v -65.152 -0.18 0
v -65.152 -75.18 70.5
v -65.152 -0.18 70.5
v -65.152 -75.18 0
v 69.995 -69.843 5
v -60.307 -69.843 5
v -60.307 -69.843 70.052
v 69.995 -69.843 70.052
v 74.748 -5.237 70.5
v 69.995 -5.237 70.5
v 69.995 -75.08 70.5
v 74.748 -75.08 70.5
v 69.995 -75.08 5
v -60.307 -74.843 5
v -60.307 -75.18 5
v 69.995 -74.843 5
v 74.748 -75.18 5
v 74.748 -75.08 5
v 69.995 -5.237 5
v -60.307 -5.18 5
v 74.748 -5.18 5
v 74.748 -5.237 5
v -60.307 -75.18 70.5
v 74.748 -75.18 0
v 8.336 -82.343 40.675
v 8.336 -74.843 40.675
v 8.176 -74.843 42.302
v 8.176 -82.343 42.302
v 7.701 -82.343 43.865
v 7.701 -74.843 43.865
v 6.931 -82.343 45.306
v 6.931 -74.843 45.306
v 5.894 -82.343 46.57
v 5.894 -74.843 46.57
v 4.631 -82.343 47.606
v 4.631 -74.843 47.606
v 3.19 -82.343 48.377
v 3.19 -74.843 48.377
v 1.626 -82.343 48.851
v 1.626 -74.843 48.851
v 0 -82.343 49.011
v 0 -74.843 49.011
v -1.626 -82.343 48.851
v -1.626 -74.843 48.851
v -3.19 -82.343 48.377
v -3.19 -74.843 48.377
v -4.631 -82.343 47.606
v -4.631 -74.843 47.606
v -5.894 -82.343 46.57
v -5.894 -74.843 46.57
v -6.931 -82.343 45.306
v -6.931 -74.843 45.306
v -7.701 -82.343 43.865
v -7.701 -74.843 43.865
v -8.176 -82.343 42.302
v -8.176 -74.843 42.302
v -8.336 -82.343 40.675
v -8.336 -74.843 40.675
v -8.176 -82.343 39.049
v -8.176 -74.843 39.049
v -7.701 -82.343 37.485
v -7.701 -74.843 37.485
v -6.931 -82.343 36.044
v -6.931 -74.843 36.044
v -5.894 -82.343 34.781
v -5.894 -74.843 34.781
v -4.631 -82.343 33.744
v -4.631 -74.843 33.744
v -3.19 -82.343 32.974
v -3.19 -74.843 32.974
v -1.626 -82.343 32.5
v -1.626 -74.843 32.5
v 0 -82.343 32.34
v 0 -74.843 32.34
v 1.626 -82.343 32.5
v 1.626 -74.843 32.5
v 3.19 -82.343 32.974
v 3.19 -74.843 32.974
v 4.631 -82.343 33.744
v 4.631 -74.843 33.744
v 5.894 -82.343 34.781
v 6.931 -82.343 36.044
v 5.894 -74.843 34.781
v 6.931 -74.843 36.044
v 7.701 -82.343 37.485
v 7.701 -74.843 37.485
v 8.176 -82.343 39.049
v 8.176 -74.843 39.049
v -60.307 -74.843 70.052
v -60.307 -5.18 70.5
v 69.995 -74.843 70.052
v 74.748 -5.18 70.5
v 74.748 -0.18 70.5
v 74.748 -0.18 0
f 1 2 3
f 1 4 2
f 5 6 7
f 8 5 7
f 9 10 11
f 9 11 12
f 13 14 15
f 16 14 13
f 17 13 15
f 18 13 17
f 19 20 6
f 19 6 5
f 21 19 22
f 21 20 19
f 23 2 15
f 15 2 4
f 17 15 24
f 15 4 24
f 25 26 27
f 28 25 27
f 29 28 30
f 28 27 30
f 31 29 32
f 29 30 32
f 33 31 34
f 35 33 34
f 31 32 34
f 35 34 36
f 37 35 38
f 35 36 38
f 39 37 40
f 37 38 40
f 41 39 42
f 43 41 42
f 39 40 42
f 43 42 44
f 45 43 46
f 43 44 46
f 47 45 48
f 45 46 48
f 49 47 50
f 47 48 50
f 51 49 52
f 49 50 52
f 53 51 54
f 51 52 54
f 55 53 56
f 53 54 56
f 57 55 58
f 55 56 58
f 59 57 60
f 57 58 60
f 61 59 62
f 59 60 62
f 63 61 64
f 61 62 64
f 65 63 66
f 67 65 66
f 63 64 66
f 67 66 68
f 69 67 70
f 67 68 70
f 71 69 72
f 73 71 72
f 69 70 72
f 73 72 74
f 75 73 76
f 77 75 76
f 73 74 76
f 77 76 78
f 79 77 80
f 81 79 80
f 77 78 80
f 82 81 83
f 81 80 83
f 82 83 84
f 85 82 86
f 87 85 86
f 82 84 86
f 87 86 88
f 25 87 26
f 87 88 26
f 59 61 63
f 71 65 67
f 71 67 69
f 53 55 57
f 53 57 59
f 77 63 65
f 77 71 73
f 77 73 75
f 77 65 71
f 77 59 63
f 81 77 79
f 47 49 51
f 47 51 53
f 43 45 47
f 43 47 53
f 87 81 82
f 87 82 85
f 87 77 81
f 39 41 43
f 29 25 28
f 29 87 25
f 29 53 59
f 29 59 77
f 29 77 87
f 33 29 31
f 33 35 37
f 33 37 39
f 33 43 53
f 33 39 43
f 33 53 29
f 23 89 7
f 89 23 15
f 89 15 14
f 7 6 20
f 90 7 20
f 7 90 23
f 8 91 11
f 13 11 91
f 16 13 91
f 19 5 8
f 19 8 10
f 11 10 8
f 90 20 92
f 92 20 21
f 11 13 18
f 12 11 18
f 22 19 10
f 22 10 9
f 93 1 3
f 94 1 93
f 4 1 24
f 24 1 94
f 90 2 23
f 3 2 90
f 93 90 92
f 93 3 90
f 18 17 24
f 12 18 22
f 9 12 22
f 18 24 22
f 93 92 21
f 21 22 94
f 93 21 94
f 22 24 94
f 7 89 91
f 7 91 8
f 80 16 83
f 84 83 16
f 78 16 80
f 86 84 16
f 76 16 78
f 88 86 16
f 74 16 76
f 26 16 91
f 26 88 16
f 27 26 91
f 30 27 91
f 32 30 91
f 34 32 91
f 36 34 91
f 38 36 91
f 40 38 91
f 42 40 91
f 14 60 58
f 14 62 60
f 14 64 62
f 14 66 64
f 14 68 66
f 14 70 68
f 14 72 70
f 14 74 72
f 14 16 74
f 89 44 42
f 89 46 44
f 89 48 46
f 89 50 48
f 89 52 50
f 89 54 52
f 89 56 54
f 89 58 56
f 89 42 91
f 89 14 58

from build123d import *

# Parameters (mm, degrees)
F0_W      = 139.9
F0_H      = 75
F1_DEPTH  = 5
F2_W      = 139.9
F2_H      = 5
F5_DEPTH  = 65.5
F3_W      = 4.8456325173
F3_H      = 70
F6_DEPTH  = 65.5
F4_W      = 4.7526705265
F4_H      = 69.843
F7_DEPTH  = 65.5
F9_W      = 5
F9_H      = 65.0515219681
F10_DEPTH = 132.6
F11_R     = 8.3357715152
F12_DEPTH = 7.5


with BuildPart() as f1:
    # F0 (on Top) → F1 (new body)
    with BuildSketch(Plane.XY):
        with Locations((4.7975996614, -37.6802921295)):
            Rectangle(F0_W, F0_H)
    extrude(amount=F1_DEPTH)

    # F2 (on face) → F5 (join)
    with BuildSketch(Plane.XY.offset(5)):
        with Locations((4.7975996614, -2.6802921295)):
            Rectangle(F2_W, F2_H)
    extrude(amount=F5_DEPTH)

    # F3 (on face) → F6 (join)
    with BuildSketch(Plane.XY.offset(5)):
        with Locations((-62.72958408, -40.1802921295)):
            Rectangle(F3_W, F3_H)
    extrude(amount=F6_DEPTH)

    # F4 (on face) → F7 (join)
    with BuildSketch(Plane.XY.offset(5)):
        with Locations((72.3712643981, -40.1582837973)):
            Rectangle(F4_W, F4_H)
    extrude(amount=F7_DEPTH)

    # F9 (on face) → F10 (join)
    with BuildSketch(Plane.YZ.offset(-60.3067678213)):
        with Locations((-72.3428228498, 37.525760984)):
            Rectangle(F9_W, F9_H)
    extrude(amount=F10_DEPTH)

    # F11 (on face) → F12 (join)
    with BuildSketch(Plane.XZ.offset(74.8428228498)):
        with Locations((0, 40.6753867865)):
            Circle(F11_R)
    extrude(amount=F12_DEPTH)


solid = f1.part
